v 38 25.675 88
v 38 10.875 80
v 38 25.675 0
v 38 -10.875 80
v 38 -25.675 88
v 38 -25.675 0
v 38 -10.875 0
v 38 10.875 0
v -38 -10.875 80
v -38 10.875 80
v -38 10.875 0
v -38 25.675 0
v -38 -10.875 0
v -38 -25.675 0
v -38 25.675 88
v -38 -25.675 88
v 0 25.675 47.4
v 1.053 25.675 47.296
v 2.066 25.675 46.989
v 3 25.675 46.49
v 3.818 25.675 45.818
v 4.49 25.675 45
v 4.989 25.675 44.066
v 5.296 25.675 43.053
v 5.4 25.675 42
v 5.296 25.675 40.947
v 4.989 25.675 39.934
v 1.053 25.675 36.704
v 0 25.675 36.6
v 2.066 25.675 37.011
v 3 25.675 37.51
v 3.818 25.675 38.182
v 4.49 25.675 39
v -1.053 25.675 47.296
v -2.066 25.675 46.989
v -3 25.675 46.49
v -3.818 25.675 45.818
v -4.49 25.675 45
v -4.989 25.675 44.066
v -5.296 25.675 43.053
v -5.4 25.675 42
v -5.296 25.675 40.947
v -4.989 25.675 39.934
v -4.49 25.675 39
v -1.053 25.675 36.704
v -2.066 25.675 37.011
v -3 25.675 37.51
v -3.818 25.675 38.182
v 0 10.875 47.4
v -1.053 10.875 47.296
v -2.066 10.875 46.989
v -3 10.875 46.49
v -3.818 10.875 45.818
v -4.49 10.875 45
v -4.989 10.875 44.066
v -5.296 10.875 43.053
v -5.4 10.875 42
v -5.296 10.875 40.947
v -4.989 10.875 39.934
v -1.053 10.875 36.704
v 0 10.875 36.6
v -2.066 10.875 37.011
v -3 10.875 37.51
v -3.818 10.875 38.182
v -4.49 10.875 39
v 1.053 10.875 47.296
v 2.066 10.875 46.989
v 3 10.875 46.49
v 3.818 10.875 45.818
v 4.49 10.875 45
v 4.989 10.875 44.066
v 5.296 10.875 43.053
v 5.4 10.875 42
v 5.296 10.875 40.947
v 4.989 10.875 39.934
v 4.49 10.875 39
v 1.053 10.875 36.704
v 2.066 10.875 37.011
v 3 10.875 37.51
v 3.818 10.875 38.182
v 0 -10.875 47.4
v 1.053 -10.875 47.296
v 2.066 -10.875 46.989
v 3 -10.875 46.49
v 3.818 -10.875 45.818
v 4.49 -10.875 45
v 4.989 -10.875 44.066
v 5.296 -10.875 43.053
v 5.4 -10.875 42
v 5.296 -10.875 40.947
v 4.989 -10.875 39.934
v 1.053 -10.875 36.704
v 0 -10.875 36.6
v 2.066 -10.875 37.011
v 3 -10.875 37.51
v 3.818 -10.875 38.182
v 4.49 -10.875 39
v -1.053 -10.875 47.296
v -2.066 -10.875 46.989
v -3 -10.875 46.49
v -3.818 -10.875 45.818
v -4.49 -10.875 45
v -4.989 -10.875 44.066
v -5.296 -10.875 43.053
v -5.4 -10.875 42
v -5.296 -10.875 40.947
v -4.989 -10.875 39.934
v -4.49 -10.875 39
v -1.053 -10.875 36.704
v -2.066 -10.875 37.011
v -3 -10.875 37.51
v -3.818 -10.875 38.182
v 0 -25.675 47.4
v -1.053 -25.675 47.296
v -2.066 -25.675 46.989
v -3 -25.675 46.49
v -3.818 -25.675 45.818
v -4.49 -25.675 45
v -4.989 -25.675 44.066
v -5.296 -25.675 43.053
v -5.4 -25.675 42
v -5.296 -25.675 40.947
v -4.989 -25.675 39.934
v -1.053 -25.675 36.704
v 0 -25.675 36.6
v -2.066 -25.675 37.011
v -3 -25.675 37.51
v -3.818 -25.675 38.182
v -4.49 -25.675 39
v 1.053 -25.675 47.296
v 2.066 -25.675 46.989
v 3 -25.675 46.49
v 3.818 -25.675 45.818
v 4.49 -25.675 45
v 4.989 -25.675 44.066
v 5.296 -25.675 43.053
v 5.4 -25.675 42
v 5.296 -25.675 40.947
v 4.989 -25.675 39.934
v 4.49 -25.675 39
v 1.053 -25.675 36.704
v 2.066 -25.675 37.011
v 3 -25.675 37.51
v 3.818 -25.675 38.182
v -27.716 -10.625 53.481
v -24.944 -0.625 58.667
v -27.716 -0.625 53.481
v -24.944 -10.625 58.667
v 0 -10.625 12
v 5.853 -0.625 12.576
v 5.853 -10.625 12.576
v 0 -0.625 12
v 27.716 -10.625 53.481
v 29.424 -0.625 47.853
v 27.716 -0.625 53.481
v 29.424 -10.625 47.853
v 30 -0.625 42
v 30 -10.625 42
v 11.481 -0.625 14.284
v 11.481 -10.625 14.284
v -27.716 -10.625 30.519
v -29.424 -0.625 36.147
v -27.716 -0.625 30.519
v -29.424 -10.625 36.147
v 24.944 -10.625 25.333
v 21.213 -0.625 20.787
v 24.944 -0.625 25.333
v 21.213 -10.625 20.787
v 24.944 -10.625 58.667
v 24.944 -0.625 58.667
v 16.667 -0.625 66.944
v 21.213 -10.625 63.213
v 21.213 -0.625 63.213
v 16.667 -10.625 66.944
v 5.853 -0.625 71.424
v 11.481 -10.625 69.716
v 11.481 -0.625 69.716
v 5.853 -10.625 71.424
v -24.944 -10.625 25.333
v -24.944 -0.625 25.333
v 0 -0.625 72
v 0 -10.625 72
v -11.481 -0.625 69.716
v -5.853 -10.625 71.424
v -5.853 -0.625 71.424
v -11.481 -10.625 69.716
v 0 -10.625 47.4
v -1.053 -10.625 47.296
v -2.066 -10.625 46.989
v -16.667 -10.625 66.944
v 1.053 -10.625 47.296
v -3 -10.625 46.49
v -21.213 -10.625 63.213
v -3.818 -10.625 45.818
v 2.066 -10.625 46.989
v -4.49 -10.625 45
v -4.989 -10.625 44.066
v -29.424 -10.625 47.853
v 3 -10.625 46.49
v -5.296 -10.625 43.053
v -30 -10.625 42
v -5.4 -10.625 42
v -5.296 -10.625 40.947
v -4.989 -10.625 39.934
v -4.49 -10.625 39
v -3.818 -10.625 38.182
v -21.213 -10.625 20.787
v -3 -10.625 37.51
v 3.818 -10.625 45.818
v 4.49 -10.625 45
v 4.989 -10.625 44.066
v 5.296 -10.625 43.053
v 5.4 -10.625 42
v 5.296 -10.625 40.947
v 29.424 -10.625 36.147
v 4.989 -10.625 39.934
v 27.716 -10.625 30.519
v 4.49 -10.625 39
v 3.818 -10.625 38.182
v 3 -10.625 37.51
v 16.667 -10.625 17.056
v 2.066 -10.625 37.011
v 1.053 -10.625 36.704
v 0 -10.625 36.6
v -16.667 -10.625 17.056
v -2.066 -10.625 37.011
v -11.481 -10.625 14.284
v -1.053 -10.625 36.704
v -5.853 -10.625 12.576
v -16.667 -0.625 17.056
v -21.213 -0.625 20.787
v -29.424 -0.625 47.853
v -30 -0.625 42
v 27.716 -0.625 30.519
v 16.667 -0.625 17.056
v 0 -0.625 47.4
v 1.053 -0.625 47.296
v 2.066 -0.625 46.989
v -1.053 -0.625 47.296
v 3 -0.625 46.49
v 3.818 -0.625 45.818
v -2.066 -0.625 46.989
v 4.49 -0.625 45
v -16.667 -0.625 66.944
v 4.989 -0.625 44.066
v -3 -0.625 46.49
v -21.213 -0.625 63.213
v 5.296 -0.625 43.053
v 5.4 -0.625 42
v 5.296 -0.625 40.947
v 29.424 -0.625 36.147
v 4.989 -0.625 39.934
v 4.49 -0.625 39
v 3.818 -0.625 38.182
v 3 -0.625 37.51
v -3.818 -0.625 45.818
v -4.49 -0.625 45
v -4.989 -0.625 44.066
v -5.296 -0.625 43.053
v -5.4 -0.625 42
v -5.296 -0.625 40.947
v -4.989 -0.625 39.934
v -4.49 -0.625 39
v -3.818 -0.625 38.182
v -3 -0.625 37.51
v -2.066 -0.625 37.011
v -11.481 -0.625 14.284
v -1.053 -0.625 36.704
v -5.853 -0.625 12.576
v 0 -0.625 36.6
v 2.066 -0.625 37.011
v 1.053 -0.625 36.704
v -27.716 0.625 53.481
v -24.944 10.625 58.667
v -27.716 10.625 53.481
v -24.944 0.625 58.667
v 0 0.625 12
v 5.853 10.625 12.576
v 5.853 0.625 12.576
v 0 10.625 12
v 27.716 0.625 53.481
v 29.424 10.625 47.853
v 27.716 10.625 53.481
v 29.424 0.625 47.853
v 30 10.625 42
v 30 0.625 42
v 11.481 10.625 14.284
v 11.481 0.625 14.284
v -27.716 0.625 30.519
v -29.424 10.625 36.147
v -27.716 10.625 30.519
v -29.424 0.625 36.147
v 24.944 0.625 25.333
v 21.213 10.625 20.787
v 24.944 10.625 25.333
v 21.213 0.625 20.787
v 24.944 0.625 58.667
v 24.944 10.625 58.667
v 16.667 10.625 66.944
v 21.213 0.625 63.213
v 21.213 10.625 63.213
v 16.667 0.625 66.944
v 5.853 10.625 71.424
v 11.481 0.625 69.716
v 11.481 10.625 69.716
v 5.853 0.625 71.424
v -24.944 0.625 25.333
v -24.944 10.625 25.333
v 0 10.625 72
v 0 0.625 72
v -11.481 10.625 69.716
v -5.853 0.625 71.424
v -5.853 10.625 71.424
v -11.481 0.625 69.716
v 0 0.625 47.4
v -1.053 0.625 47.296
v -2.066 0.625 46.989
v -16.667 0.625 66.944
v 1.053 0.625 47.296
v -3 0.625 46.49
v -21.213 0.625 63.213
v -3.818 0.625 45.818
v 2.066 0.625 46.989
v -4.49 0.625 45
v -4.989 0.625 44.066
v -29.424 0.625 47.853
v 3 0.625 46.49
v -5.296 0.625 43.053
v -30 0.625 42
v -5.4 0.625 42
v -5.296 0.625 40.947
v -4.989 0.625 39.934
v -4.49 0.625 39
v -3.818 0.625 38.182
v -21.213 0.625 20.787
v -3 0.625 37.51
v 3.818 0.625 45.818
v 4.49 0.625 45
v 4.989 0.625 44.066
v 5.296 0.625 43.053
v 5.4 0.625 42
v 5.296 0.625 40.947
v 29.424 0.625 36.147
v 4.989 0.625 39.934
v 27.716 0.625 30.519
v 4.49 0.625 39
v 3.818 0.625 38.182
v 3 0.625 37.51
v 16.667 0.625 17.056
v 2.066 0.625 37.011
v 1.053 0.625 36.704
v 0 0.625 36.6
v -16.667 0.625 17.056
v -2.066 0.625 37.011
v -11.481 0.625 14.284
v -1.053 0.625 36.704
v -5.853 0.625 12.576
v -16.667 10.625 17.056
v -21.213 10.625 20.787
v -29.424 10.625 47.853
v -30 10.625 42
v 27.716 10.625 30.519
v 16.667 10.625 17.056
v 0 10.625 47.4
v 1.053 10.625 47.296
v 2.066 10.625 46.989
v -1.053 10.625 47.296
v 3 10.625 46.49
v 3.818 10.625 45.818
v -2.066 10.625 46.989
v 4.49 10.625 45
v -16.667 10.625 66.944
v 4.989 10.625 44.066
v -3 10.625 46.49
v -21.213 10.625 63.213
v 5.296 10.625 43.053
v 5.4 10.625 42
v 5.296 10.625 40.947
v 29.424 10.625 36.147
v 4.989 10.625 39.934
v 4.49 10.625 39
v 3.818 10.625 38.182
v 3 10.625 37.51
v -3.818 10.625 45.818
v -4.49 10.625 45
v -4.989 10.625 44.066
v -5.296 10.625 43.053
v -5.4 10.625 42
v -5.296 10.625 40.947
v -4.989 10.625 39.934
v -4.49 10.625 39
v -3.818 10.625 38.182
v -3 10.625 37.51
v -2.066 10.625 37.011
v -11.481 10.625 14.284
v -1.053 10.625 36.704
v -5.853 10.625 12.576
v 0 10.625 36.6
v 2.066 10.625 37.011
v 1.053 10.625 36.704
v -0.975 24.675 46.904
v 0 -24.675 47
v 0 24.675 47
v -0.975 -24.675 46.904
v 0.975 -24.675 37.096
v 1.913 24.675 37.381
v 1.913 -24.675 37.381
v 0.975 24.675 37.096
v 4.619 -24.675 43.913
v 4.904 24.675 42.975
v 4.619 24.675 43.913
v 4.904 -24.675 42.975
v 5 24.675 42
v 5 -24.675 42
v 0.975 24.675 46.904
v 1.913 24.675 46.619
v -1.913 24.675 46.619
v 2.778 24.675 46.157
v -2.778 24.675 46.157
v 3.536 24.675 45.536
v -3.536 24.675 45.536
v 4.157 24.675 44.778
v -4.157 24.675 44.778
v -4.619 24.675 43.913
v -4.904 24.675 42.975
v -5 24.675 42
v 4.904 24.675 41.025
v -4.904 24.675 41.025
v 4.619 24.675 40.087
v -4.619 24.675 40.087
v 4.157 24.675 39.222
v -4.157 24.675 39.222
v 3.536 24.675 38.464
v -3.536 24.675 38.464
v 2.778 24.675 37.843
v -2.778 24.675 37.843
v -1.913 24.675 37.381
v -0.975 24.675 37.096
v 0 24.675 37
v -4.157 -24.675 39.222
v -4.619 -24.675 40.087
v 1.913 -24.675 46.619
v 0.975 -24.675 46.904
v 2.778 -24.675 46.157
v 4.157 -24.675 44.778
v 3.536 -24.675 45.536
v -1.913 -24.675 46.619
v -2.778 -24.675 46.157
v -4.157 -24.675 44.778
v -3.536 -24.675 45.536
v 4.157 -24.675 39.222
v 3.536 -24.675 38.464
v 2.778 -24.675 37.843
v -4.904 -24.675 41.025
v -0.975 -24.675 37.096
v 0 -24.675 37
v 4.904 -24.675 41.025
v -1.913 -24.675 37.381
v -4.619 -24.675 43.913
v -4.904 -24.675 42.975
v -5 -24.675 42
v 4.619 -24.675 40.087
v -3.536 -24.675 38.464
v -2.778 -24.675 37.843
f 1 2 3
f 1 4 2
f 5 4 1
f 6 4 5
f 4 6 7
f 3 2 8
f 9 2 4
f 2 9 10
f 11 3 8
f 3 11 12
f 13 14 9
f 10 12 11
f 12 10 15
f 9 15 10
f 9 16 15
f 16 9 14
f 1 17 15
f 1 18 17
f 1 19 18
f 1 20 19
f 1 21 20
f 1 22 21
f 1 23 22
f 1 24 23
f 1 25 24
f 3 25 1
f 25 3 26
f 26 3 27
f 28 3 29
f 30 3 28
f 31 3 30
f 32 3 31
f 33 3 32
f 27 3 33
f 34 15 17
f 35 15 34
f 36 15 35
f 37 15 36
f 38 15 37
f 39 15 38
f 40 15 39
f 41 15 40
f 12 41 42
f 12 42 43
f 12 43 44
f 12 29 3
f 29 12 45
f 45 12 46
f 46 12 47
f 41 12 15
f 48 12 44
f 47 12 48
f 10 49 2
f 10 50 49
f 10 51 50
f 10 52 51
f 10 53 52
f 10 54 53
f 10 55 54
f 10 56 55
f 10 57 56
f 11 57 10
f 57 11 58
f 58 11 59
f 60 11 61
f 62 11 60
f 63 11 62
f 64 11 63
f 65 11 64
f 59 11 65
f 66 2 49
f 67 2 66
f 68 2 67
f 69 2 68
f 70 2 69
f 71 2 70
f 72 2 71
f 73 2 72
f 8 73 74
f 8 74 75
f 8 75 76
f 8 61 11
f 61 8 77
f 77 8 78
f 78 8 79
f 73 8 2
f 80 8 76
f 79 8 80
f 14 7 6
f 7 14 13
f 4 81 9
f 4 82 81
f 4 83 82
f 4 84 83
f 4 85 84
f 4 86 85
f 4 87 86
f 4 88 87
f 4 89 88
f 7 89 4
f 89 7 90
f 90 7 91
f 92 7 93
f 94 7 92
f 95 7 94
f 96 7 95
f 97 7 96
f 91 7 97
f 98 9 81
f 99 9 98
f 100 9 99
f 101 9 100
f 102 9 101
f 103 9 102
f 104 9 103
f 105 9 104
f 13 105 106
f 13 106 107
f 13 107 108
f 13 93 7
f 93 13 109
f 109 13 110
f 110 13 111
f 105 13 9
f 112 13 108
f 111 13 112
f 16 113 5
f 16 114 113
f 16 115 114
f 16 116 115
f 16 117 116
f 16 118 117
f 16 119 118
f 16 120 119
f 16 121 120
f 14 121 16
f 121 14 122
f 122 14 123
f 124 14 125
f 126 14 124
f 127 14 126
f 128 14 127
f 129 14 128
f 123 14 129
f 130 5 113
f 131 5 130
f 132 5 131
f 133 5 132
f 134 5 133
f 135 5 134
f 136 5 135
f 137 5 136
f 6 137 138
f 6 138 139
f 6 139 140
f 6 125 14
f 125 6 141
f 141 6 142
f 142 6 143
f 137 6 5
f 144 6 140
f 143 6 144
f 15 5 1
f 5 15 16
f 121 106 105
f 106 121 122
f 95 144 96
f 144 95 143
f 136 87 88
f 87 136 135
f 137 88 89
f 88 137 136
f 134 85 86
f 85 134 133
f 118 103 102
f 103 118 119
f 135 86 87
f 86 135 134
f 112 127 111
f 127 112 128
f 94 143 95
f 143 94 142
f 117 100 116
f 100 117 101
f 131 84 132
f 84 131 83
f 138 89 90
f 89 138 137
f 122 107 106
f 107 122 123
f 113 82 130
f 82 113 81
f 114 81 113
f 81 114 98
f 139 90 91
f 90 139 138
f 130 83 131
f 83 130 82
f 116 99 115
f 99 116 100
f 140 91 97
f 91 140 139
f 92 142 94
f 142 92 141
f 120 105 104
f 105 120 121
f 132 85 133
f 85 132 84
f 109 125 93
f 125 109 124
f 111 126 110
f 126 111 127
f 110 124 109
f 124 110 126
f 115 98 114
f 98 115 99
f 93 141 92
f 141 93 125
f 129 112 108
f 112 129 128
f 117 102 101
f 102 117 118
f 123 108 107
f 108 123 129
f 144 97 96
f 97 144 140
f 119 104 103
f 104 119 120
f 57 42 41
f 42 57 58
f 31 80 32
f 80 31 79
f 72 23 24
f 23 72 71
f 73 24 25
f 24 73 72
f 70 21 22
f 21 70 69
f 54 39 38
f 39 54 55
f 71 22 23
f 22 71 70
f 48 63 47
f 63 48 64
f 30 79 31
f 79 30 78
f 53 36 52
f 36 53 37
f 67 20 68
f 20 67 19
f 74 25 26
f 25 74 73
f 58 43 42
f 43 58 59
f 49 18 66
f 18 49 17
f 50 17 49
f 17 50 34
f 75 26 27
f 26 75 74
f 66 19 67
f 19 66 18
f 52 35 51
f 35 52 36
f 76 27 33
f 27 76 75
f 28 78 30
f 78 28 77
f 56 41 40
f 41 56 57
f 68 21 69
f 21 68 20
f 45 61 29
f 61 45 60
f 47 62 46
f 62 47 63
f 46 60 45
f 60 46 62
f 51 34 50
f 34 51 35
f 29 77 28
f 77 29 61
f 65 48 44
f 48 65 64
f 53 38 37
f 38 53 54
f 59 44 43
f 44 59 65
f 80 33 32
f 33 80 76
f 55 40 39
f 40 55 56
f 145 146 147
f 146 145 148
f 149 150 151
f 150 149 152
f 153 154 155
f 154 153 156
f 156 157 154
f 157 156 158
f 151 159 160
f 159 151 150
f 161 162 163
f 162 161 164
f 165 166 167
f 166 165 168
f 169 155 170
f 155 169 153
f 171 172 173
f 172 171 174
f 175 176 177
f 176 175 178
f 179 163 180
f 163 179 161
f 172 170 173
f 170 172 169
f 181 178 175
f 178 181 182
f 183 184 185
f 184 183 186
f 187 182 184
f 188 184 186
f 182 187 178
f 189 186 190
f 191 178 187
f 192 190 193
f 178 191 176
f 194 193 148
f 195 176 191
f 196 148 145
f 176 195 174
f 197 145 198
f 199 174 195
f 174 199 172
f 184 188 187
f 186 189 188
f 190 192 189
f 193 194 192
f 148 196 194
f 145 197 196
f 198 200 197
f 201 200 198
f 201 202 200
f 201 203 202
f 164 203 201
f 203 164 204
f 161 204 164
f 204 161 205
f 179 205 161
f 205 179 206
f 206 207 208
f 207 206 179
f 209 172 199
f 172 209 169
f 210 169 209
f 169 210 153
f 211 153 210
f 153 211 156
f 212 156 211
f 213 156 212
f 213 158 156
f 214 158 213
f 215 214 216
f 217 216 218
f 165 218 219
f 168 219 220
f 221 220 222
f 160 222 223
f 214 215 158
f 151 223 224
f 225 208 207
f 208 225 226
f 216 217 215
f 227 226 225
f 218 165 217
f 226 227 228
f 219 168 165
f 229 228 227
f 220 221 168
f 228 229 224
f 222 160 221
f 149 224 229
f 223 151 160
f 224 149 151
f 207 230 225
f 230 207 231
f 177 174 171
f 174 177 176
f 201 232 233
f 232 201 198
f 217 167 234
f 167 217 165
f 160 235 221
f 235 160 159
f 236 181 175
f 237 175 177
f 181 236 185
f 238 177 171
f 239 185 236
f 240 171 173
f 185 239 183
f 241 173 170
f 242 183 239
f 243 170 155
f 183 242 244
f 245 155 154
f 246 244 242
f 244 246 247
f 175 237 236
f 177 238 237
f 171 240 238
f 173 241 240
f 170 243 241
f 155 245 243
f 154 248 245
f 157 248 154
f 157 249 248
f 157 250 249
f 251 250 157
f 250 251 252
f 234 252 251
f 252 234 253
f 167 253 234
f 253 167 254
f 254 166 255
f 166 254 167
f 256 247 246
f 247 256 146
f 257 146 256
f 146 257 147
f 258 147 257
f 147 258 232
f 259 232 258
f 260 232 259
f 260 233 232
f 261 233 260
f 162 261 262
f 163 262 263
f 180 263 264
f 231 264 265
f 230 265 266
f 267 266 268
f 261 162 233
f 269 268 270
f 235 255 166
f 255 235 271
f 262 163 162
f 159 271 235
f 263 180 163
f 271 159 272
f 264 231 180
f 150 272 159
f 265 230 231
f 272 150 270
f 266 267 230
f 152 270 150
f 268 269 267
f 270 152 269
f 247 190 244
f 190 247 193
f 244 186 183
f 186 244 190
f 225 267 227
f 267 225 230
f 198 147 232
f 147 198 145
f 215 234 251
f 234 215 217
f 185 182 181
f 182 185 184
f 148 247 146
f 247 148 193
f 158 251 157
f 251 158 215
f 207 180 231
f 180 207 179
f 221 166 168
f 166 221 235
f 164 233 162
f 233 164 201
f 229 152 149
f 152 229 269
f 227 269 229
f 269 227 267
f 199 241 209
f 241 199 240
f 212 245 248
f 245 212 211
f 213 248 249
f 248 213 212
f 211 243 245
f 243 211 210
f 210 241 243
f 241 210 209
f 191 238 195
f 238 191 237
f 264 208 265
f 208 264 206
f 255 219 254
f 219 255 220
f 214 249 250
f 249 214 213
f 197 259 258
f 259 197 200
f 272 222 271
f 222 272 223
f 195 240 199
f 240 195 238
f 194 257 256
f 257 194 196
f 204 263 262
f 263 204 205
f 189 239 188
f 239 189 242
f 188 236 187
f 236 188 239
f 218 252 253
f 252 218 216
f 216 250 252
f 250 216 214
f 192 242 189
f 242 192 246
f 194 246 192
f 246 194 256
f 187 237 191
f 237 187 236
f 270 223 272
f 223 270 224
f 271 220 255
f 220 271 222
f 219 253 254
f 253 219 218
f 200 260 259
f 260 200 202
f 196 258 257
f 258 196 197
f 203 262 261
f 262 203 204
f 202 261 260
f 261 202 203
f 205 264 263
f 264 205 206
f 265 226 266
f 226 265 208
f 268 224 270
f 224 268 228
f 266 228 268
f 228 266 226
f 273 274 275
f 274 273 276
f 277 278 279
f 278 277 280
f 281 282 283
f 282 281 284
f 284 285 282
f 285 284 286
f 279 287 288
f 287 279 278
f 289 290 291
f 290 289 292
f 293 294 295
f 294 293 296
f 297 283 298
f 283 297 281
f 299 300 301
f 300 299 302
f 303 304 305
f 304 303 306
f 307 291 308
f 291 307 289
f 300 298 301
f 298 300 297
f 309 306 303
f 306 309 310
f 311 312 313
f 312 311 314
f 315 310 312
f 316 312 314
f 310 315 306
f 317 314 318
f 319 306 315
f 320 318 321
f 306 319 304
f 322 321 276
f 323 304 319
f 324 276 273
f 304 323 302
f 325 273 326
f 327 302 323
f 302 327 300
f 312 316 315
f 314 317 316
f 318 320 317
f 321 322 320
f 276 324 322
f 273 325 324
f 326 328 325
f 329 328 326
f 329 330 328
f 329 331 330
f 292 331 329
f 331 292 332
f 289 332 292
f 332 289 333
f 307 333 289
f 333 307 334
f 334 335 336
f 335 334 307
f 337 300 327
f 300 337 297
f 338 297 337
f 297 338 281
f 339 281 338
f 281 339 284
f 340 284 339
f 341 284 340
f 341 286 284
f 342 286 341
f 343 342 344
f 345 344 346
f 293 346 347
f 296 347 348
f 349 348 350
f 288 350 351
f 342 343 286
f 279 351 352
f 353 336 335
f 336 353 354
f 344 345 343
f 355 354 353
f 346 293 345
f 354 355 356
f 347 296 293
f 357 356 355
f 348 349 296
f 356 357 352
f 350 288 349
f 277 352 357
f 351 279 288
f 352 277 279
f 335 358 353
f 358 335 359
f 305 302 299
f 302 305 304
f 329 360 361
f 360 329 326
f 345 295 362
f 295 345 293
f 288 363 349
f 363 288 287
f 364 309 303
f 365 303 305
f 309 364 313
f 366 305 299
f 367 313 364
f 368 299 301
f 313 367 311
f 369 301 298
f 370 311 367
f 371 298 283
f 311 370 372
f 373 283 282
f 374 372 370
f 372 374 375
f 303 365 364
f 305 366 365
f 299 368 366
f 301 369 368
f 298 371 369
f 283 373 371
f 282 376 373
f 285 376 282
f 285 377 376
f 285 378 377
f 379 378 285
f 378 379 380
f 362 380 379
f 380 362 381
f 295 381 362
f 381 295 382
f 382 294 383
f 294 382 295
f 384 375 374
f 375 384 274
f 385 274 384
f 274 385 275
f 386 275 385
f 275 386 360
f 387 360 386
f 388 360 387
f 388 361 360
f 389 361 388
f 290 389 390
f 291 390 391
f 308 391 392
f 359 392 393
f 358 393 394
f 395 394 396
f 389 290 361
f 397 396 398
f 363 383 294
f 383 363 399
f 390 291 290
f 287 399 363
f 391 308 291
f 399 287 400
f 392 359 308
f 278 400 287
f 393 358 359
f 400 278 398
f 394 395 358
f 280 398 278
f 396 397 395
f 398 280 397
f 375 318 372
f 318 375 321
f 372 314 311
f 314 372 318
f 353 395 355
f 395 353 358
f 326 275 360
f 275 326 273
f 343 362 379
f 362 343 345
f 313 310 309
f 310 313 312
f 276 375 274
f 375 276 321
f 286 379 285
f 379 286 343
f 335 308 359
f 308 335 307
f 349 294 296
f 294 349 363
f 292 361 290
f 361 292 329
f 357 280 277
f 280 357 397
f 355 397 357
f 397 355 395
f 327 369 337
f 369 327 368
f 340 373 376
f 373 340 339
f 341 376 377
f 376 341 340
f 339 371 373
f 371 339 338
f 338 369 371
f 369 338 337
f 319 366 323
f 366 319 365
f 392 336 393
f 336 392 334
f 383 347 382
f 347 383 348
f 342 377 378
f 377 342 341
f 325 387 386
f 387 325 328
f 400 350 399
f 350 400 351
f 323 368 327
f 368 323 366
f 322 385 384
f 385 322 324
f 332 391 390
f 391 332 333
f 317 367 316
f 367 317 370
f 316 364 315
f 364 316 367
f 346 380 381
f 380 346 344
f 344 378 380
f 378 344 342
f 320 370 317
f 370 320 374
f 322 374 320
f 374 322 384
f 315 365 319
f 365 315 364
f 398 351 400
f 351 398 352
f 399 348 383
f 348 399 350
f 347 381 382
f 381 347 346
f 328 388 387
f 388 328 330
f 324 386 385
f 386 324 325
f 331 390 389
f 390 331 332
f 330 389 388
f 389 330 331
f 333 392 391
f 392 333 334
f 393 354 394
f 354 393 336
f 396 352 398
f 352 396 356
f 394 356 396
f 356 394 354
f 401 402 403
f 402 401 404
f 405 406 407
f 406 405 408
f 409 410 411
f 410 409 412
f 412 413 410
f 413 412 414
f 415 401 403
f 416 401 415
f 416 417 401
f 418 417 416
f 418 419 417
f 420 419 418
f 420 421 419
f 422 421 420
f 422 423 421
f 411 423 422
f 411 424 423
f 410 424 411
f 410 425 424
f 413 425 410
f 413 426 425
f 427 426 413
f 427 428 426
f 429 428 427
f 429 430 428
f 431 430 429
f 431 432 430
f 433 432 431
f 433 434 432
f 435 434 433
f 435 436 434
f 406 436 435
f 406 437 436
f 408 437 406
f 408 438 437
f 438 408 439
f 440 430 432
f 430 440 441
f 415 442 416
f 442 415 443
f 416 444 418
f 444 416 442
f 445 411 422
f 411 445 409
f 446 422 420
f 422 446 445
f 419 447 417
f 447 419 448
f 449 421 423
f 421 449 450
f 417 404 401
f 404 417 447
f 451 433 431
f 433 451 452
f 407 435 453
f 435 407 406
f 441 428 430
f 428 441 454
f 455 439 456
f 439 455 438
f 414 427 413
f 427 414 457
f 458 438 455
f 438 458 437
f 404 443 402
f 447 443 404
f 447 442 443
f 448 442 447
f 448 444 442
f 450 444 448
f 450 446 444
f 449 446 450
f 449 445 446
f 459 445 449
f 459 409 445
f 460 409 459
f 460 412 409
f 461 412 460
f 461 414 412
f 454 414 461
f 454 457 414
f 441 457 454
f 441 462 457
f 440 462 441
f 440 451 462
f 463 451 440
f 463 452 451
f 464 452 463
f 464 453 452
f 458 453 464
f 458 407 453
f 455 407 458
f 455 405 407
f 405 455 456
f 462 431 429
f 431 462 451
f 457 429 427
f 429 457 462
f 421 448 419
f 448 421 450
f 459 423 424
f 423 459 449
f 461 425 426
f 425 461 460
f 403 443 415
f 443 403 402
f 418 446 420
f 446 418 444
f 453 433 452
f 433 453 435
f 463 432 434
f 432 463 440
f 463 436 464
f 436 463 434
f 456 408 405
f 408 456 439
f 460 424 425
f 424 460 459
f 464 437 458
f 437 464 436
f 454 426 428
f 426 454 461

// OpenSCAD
$fn = 32;

// ------------------------------------------------------------------------
// Trolley wheel set: wheels d60, fork 80 mm tall
// Every part is its own module, assembly() places every instance.
// ------------------------------------------------------------------------

// --- part 1 ---
module trolley_fork() {
  difference() {
    union() {
      translate([-38, 10.875, 0]) cube([76, 14.8, 80]);
      translate([-38, -25.675, 0]) cube([76, 14.8, 80]);
      translate([-38, -25.675, 80]) cube([76, 51.35, 8]);
    }
    translate([0, -18.275, 42]) rotate([90, 0, 0]) cylinder(h = 16.8, d = 10.8, center = true);
    translate([0, 18.275, 42]) rotate([90, 0, 0]) cylinder(h = 16.8, d = 10.8, center = true);
  }
}

// --- part 2 ---
module trolley_wheel() {
  difference() {
      translate([0, 0, 0]) cylinder(h = 10, d = 60);
      translate([0, 0, -1]) cylinder(h = 12, d = 10.8);
    }
}

// --- part 3 ---
module trolley_axle() {
  translate([0, 0, -24.675]) cylinder(h = 49.35, d = 10);
}

// --- assembly ---
module assembly() {
  color([0.80, 0.24, 0.20]) translate([0, 0, 0]) rotate([0, 0, 0]) trolley_fork();
  color([0.20, 0.45, 0.75]) translate([0, -0.625, 42]) rotate([90, 0, 0]) trolley_wheel();
  color([0.25, 0.62, 0.32]) translate([0, 10.625, 42]) rotate([90, 0, 0]) trolley_wheel();
  color([0.92, 0.70, 0.18]) translate([0, 0, 42]) rotate([90, 0, 0]) trolley_axle();
}

assembly();
